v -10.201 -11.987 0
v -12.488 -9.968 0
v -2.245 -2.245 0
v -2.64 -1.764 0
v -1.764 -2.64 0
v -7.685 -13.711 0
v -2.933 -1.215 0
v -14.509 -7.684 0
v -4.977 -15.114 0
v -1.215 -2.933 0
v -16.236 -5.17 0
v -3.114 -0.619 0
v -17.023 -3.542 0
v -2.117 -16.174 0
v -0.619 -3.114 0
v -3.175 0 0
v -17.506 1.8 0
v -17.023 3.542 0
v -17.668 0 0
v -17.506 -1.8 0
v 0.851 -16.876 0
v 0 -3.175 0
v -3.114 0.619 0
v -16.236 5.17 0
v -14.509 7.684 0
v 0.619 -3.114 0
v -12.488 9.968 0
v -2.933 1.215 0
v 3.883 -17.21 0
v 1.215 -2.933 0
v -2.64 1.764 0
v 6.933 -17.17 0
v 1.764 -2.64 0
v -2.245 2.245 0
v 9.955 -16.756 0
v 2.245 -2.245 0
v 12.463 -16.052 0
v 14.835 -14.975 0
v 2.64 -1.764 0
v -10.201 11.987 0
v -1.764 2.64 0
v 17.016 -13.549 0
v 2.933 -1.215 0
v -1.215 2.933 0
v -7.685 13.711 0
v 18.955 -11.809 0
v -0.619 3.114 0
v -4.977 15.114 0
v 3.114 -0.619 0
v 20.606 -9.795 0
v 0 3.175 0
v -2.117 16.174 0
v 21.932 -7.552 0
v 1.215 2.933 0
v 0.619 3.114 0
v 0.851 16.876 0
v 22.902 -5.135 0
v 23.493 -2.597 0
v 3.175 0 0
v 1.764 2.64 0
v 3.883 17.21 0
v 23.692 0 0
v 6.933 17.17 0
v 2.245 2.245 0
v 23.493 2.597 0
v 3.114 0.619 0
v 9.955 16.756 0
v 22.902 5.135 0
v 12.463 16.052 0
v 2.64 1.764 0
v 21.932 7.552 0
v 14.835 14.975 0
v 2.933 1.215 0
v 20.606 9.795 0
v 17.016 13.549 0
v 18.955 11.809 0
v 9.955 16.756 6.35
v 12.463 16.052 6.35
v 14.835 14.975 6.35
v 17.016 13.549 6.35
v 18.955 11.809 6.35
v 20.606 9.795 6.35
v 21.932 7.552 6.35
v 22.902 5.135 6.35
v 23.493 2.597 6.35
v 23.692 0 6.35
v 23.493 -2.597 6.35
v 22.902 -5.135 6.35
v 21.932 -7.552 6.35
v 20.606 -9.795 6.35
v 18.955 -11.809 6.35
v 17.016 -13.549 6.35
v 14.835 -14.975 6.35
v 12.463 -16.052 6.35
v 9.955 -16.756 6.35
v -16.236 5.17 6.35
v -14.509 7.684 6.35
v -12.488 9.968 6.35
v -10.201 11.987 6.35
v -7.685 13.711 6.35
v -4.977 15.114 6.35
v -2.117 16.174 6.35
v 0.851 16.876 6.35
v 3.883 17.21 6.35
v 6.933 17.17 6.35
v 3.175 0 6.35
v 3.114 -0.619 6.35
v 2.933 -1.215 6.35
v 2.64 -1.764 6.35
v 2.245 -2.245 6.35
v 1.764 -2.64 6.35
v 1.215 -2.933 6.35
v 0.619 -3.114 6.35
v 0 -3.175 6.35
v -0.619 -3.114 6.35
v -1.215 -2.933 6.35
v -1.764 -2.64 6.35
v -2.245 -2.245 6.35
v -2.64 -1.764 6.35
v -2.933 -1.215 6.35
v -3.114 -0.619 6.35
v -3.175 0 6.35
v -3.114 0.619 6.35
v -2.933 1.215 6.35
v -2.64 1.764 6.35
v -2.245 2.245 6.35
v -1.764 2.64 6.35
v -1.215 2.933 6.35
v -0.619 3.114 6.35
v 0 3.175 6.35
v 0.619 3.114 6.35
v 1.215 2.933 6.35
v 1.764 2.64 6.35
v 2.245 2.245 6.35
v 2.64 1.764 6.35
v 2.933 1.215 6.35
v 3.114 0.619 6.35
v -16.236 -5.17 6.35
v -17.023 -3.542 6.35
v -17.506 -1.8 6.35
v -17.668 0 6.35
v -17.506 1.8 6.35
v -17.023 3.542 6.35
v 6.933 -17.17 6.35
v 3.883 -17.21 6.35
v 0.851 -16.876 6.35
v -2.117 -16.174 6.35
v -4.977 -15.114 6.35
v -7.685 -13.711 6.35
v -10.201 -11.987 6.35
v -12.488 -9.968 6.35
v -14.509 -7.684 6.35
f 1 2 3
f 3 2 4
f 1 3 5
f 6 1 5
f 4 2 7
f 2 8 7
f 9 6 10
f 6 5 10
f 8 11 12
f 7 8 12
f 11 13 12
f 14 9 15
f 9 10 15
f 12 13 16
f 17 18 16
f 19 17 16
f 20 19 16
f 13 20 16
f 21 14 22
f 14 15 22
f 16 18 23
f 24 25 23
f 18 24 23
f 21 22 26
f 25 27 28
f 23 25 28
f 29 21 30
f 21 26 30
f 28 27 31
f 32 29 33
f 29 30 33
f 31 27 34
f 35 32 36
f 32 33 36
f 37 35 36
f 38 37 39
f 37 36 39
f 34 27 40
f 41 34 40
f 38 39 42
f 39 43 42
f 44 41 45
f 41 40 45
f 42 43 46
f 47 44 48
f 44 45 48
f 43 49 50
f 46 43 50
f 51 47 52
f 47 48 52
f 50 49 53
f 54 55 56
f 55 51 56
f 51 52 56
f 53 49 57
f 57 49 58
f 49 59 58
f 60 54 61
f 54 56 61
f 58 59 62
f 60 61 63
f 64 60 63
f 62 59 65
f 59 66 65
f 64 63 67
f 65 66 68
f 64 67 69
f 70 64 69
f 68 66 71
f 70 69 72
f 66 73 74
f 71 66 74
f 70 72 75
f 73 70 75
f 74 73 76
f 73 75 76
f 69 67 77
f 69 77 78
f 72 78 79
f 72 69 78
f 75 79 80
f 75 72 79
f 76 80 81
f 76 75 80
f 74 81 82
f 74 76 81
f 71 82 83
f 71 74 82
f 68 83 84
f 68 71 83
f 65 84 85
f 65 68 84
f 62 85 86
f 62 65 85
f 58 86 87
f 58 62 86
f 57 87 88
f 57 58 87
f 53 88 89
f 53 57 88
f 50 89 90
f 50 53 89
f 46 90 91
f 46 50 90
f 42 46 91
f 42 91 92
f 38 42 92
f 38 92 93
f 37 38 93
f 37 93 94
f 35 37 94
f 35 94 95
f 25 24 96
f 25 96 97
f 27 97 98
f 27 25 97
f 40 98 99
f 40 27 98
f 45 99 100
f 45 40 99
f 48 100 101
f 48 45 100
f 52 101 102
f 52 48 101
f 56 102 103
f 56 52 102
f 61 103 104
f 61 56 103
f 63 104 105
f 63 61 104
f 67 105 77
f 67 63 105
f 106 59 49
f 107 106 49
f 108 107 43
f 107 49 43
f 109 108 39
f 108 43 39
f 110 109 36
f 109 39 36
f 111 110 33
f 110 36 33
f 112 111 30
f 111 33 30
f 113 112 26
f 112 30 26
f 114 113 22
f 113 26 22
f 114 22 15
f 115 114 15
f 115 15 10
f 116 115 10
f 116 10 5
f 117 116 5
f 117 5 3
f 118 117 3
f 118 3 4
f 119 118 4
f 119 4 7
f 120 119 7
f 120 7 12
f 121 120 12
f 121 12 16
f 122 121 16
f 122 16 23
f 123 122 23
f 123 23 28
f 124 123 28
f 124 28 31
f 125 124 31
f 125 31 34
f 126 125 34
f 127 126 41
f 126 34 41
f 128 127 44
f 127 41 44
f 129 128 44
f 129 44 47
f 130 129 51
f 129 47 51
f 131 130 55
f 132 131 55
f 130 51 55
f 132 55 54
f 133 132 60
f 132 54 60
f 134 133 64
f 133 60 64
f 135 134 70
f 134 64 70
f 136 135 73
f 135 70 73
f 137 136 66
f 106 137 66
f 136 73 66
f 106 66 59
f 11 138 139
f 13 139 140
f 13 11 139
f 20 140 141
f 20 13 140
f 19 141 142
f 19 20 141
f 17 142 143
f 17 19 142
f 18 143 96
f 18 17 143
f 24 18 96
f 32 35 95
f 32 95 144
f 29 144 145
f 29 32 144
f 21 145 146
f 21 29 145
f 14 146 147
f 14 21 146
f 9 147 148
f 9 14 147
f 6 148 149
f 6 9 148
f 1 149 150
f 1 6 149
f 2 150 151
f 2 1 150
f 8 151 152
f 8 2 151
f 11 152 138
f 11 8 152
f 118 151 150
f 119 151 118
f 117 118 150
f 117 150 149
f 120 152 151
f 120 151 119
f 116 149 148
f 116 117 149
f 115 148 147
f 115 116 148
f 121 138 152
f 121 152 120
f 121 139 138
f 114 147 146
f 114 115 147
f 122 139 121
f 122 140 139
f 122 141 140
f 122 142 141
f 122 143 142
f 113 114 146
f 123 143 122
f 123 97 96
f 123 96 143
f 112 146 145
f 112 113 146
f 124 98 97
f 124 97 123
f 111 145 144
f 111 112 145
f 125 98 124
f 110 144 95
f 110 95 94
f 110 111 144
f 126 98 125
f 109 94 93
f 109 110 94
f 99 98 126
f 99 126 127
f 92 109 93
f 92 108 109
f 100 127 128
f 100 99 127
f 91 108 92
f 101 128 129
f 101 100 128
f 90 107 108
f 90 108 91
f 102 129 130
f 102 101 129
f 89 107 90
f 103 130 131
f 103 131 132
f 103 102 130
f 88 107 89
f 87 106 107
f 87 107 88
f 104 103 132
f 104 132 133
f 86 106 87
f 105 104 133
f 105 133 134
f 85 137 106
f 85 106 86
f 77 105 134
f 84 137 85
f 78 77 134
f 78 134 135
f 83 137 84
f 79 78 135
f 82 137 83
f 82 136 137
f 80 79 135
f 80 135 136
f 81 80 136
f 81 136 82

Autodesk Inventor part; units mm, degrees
ref_plane "YZ Plane" through (0, 0, 0) normal (1, 0, 0) x (0, 1, 0)
ref_plane "XY Plane" through (0, 0, 0) normal (0, 0, 1) x (1, 0, 0)
sketch "Sketch6" plane through (0, 0, 0) normal (0, 0, 1) x (1, 0, 0)
  arc A0 (-16.2362, 5.1697) -> (-16.2362, -5.1697) centre (-7.62, 0) ccw
  arc A1 (9.9552, 16.756) -> (-16.2362, 5.1697) centre (5.08, -7.62) ccw
  arc A2 (9.9552, -16.756) -> (9.9552, 16.756) centre (6.604, 0) ccw
  line L0 (-27.0242, 0) -> (35.6389, 0) projected
  arc A3 (-16.2362, 5.1697) -> (-16.2362, -5.1697) centre (-7.62, 0) ccw
  arc A4 (-16.2362, -5.1697) -> (9.9552, -16.756) centre (5.08, 7.62) ccw
  arc A5 (9.9552, -16.756) -> (23.6918, 0) centre (6.604, 0) ccw
  line L1 (0, -29.2695) -> (0, 29.2695) projected
  circle A6 centre (0, 0) radius 3.175
  dimension "d11" = 7.62
  dimension "d12" = 5.08
  dimension "d13" = 6.35
  dimension "d16" = 6.604
  dimension "d17" = 7.62
extrude "Extrusion2" add sketch "Sketch6" along normal blind 6.35 contours A1 L1 A6 L0 A0 | L0 A6 L1 A4 A0 | A1 A2 L0 A6 L1 | L1 A6 L0 A2 A4
properties part number "Cam disc Polyline"
